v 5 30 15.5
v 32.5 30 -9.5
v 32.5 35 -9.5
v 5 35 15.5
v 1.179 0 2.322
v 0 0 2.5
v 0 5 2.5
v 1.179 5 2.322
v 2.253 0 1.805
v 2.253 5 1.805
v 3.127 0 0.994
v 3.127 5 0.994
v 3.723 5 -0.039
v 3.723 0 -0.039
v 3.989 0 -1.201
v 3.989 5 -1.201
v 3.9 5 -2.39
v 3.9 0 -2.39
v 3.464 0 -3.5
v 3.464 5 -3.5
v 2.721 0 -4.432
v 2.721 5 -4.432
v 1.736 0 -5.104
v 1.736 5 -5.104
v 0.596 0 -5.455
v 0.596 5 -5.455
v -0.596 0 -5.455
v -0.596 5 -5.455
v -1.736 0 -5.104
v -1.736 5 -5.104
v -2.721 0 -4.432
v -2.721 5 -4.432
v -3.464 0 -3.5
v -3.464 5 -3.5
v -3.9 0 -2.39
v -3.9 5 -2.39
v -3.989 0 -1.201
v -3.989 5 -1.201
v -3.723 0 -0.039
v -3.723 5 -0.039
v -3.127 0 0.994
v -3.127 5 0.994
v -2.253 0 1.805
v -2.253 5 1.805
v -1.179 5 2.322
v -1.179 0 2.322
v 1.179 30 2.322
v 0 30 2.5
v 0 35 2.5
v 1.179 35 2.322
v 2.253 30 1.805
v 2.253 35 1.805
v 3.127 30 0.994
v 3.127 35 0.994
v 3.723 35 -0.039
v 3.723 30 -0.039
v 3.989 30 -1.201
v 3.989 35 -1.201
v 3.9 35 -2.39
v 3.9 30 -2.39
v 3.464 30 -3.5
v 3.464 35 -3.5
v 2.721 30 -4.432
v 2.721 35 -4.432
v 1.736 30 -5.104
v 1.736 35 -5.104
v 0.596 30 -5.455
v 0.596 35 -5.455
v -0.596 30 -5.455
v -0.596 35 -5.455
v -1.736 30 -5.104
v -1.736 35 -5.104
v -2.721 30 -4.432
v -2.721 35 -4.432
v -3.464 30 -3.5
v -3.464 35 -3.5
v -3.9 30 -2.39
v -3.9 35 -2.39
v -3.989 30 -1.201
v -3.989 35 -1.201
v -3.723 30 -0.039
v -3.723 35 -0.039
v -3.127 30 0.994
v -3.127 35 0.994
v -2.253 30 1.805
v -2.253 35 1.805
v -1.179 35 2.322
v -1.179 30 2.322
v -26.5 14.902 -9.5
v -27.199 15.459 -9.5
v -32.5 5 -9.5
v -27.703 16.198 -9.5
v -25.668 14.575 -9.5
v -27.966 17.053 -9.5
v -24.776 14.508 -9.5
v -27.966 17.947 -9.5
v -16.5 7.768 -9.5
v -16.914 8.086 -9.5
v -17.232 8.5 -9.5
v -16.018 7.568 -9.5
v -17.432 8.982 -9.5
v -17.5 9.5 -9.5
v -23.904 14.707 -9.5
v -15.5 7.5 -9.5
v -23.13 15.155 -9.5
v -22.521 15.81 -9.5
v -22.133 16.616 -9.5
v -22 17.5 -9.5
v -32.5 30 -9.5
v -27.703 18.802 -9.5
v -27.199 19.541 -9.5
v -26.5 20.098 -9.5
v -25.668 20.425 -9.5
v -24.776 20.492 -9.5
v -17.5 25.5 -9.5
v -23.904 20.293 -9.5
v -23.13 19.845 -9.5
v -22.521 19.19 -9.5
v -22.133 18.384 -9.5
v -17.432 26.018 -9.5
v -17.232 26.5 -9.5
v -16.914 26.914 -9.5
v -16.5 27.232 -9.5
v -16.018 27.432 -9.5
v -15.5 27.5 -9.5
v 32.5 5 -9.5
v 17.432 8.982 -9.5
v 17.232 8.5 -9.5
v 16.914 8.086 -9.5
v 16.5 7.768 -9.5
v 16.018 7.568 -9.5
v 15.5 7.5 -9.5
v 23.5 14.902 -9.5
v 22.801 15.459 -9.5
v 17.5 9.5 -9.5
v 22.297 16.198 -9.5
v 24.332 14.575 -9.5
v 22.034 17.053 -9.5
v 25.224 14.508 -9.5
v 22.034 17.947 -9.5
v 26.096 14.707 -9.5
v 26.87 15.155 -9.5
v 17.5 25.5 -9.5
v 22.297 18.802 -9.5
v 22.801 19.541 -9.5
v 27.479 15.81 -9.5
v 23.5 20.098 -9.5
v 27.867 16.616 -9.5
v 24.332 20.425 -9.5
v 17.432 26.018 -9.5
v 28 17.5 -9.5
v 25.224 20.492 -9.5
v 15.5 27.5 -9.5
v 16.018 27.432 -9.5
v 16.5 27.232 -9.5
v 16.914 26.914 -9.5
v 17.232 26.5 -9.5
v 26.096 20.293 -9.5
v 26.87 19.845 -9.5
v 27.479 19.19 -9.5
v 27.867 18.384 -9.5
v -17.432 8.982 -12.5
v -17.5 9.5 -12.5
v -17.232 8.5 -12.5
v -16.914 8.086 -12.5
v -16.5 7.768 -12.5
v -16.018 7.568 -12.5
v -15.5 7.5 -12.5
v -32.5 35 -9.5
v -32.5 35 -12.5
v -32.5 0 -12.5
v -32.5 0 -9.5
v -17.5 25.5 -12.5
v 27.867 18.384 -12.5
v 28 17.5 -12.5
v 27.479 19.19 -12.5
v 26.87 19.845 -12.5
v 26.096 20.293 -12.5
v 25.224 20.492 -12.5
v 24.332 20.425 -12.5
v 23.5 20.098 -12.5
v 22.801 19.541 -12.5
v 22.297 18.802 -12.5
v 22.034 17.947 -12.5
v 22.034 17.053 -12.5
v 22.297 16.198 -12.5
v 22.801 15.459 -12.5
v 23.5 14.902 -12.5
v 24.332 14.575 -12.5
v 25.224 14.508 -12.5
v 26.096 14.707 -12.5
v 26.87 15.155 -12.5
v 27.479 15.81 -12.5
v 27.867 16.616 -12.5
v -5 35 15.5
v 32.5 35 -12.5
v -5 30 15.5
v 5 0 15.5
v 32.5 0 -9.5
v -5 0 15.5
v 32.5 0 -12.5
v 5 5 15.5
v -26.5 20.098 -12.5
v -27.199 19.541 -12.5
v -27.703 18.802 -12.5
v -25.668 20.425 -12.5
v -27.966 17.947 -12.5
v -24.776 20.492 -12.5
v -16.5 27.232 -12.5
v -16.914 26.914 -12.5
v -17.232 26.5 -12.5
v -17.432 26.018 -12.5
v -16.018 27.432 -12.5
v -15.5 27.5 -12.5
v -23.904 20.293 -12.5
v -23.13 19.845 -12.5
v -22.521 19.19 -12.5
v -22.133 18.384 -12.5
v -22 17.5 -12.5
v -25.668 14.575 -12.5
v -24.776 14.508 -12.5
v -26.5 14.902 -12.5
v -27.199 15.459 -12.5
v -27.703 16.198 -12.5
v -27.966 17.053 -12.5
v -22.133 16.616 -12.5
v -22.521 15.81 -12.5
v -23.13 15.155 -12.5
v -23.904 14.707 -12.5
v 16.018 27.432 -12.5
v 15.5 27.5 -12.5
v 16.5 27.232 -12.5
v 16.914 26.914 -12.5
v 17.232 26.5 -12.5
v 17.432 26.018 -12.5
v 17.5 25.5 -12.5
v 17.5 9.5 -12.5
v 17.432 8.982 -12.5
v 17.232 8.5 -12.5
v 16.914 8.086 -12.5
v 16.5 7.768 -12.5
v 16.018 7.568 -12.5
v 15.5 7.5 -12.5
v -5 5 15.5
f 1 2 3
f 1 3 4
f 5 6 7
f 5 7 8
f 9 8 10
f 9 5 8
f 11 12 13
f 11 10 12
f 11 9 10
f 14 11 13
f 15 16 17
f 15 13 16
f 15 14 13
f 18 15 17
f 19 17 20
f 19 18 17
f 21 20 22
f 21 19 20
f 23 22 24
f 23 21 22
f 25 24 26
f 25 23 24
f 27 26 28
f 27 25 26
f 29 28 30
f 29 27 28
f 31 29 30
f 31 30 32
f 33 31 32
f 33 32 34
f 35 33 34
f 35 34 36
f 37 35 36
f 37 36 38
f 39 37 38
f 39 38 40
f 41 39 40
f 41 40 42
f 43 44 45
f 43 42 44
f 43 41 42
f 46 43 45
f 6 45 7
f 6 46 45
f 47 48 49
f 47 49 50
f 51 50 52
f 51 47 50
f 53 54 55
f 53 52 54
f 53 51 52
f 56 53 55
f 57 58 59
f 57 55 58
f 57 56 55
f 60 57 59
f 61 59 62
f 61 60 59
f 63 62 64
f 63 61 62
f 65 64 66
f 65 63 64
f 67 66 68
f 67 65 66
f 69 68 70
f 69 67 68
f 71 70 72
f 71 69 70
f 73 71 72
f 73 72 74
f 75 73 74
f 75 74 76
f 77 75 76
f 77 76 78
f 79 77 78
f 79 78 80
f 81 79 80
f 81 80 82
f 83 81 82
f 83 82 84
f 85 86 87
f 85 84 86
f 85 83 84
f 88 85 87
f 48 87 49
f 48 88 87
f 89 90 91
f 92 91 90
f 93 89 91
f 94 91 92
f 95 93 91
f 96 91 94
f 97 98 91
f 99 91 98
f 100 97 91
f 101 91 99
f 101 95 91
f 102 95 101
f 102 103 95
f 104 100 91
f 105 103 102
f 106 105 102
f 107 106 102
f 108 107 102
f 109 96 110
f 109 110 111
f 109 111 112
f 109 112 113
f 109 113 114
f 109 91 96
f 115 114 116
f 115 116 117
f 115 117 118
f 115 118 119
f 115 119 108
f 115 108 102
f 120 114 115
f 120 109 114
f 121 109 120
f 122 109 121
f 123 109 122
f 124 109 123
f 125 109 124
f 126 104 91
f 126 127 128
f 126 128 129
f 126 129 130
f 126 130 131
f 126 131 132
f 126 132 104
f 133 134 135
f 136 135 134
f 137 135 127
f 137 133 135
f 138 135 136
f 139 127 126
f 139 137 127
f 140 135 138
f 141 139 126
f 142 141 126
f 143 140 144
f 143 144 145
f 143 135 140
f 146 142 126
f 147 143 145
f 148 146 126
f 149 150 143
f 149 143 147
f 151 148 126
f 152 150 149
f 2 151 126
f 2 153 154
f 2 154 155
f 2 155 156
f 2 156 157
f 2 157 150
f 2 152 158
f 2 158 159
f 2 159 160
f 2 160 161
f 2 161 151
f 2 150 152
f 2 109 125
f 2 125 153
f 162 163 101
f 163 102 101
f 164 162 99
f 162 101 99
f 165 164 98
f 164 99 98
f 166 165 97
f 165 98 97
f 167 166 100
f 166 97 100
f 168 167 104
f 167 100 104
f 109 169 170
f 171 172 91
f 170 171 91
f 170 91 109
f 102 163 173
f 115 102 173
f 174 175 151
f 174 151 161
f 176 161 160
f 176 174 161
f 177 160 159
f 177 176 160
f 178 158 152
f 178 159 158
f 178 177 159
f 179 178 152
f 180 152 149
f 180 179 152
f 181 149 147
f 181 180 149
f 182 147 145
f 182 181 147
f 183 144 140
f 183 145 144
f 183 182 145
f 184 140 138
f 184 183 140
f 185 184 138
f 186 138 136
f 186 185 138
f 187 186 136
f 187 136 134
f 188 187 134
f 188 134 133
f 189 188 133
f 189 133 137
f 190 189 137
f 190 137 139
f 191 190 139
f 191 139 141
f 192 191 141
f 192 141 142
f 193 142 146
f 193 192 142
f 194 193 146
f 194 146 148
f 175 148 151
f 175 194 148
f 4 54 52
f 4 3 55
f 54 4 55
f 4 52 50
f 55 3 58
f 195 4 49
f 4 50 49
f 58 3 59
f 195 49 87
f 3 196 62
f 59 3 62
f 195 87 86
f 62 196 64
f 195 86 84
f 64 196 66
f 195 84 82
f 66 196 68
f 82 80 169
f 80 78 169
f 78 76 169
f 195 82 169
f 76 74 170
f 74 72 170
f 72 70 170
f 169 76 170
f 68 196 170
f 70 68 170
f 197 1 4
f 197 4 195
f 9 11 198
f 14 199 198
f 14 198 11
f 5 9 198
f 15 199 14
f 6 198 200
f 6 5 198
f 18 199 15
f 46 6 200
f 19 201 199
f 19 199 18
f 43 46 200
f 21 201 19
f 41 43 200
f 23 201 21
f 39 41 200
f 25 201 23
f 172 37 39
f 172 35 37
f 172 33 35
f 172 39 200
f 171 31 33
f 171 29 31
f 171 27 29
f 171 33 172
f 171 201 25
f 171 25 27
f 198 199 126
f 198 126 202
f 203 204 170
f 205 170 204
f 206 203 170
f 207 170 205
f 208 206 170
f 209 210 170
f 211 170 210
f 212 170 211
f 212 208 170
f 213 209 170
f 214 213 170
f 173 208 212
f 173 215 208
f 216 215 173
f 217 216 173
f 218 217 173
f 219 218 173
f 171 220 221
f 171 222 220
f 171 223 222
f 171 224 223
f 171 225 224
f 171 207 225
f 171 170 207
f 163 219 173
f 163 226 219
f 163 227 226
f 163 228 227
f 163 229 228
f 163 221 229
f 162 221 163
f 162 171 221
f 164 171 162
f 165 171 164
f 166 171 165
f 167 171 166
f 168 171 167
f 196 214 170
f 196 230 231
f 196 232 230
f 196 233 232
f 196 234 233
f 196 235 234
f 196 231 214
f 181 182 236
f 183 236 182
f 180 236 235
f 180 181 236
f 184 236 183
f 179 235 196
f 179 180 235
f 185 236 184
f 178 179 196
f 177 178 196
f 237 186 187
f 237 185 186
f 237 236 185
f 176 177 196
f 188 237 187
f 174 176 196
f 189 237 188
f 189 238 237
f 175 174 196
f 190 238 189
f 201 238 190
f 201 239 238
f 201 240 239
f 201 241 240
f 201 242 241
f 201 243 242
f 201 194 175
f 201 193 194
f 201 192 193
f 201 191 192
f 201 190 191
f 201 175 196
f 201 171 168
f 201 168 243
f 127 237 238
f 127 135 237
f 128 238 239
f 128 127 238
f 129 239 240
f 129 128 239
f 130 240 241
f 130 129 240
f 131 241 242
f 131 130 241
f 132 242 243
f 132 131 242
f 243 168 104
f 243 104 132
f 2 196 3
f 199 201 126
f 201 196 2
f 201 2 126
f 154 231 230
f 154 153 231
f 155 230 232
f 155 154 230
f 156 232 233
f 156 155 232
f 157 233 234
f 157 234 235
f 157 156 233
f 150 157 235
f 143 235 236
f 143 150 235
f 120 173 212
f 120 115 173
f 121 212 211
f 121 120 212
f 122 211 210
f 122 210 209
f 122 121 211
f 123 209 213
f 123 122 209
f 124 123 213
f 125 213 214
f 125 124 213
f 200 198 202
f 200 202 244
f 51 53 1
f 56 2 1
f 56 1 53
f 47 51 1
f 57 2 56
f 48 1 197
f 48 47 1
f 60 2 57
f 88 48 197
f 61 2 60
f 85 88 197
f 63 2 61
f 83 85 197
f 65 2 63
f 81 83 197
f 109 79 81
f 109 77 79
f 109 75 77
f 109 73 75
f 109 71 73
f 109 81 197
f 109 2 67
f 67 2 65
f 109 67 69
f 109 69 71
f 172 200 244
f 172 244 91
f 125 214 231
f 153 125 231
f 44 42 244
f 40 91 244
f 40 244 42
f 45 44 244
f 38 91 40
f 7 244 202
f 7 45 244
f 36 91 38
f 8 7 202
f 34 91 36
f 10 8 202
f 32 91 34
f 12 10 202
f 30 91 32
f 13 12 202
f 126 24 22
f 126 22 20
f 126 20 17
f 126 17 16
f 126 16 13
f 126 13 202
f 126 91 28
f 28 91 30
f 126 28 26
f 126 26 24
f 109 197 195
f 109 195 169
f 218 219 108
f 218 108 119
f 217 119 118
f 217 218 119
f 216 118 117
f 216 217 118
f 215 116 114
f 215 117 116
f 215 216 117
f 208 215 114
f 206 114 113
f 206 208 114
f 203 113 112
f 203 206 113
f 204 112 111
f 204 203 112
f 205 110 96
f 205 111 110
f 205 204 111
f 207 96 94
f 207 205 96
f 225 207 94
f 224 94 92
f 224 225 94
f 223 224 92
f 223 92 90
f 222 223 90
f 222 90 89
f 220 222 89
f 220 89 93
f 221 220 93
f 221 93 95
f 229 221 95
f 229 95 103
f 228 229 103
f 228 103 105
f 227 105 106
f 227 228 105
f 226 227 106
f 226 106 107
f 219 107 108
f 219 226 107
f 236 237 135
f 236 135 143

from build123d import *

# Parameters (mm, degrees)
BOSS_EXTRUDE1_DEPTH     = 35
CUT_EXTRUDE1_DEPTH      = 15.5
CUT_EXTRUDE1_DEPTH_BACK = 9.5
CUT_EXTRUDE2_DEPTH      = 51.214539727
CUT_EXTRUDE2_DEPTH_BACK = 51.214539727
SKETCH5_R               = 3
SKETCH5_W               = 35
SKETCH5_H               = 20
FILLET1_R               = 2
CUT_EXTRUDE3_DEPTH      = 51.214539727
CUT_EXTRUDE3_DEPTH_BACK = 51.214539727
SKETCH6_R               = 4


with BuildPart() as part:
    # Sketch1 → Boss-Extrude1 (new body)
    with BuildSketch(Plane(origin=(0, 0, 0), x_dir=(1, 0, 0), z_dir=(0, 1, 0))):
        Polygon((-32.5, 12.5), (32.5, 12.5), (32.5, 9.5), (5, -15.5), (-5, -15.5), (-32.5, 9.5), align=None)
    extrude(amount=BOSS_EXTRUDE1_DEPTH)

    # Sketch4 → Cut-Extrude1 (cut, two sides: drawn at the far end of the back side and taken through both)
    with BuildSketch(Plane.XY.offset(-CUT_EXTRUDE1_DEPTH_BACK)):
        Polygon((-23.214285714, 30), (23.214285714, 5), (32.5, 5), (32.5, 30), align=None)
        Polygon((-32.5, 5), (23.214285714, 5), (-23.214285714, 30), (-32.5, 30), align=None)
    extrude(amount=CUT_EXTRUDE1_DEPTH + CUT_EXTRUDE1_DEPTH_BACK, mode=Mode.SUBTRACT)

    # Sketch5 → Cut-Extrude2 (cut, two sides: drawn at the far end of the back side and taken through both)
    with BuildSketch(Plane.XY.offset(-CUT_EXTRUDE2_DEPTH_BACK)):
        with Locations((-25, 17.5)):
            Circle(SKETCH5_R)
        with Locations((25, 17.5)):
            Circle(SKETCH5_R)
        with Locations((0, 17.5)):
            Rectangle(SKETCH5_W, SKETCH5_H)
    extrude(amount=CUT_EXTRUDE2_DEPTH + CUT_EXTRUDE2_DEPTH_BACK, mode=Mode.SUBTRACT)

    # Fillet1
    fillet1_edges = [part.edges().sort_by_distance(p)[0] for p in [
        (17.5, 27.5, -11),
        (17.5, 7.5, -11),
        (-17.5, 7.5, -11),
        (-17.5, 27.5, -11),
    ]]
    fillet(fillet1_edges, radius=FILLET1_R)

    # Sketch6 → Cut-Extrude3 (cut, two sides: drawn at the far end of the back side and taken through both)
    with BuildSketch(Plane(origin=(0, 35, 0), x_dir=(1, 0, 0), z_dir=(0, 1, 0)).offset(-CUT_EXTRUDE3_DEPTH_BACK)):
        with Locations(Location((0, 1.5, 0), (0, 0, 270))):
            Circle(SKETCH6_R)
    extrude(amount=CUT_EXTRUDE3_DEPTH + CUT_EXTRUDE3_DEPTH_BACK, mode=Mode.SUBTRACT)


solid = part.part
